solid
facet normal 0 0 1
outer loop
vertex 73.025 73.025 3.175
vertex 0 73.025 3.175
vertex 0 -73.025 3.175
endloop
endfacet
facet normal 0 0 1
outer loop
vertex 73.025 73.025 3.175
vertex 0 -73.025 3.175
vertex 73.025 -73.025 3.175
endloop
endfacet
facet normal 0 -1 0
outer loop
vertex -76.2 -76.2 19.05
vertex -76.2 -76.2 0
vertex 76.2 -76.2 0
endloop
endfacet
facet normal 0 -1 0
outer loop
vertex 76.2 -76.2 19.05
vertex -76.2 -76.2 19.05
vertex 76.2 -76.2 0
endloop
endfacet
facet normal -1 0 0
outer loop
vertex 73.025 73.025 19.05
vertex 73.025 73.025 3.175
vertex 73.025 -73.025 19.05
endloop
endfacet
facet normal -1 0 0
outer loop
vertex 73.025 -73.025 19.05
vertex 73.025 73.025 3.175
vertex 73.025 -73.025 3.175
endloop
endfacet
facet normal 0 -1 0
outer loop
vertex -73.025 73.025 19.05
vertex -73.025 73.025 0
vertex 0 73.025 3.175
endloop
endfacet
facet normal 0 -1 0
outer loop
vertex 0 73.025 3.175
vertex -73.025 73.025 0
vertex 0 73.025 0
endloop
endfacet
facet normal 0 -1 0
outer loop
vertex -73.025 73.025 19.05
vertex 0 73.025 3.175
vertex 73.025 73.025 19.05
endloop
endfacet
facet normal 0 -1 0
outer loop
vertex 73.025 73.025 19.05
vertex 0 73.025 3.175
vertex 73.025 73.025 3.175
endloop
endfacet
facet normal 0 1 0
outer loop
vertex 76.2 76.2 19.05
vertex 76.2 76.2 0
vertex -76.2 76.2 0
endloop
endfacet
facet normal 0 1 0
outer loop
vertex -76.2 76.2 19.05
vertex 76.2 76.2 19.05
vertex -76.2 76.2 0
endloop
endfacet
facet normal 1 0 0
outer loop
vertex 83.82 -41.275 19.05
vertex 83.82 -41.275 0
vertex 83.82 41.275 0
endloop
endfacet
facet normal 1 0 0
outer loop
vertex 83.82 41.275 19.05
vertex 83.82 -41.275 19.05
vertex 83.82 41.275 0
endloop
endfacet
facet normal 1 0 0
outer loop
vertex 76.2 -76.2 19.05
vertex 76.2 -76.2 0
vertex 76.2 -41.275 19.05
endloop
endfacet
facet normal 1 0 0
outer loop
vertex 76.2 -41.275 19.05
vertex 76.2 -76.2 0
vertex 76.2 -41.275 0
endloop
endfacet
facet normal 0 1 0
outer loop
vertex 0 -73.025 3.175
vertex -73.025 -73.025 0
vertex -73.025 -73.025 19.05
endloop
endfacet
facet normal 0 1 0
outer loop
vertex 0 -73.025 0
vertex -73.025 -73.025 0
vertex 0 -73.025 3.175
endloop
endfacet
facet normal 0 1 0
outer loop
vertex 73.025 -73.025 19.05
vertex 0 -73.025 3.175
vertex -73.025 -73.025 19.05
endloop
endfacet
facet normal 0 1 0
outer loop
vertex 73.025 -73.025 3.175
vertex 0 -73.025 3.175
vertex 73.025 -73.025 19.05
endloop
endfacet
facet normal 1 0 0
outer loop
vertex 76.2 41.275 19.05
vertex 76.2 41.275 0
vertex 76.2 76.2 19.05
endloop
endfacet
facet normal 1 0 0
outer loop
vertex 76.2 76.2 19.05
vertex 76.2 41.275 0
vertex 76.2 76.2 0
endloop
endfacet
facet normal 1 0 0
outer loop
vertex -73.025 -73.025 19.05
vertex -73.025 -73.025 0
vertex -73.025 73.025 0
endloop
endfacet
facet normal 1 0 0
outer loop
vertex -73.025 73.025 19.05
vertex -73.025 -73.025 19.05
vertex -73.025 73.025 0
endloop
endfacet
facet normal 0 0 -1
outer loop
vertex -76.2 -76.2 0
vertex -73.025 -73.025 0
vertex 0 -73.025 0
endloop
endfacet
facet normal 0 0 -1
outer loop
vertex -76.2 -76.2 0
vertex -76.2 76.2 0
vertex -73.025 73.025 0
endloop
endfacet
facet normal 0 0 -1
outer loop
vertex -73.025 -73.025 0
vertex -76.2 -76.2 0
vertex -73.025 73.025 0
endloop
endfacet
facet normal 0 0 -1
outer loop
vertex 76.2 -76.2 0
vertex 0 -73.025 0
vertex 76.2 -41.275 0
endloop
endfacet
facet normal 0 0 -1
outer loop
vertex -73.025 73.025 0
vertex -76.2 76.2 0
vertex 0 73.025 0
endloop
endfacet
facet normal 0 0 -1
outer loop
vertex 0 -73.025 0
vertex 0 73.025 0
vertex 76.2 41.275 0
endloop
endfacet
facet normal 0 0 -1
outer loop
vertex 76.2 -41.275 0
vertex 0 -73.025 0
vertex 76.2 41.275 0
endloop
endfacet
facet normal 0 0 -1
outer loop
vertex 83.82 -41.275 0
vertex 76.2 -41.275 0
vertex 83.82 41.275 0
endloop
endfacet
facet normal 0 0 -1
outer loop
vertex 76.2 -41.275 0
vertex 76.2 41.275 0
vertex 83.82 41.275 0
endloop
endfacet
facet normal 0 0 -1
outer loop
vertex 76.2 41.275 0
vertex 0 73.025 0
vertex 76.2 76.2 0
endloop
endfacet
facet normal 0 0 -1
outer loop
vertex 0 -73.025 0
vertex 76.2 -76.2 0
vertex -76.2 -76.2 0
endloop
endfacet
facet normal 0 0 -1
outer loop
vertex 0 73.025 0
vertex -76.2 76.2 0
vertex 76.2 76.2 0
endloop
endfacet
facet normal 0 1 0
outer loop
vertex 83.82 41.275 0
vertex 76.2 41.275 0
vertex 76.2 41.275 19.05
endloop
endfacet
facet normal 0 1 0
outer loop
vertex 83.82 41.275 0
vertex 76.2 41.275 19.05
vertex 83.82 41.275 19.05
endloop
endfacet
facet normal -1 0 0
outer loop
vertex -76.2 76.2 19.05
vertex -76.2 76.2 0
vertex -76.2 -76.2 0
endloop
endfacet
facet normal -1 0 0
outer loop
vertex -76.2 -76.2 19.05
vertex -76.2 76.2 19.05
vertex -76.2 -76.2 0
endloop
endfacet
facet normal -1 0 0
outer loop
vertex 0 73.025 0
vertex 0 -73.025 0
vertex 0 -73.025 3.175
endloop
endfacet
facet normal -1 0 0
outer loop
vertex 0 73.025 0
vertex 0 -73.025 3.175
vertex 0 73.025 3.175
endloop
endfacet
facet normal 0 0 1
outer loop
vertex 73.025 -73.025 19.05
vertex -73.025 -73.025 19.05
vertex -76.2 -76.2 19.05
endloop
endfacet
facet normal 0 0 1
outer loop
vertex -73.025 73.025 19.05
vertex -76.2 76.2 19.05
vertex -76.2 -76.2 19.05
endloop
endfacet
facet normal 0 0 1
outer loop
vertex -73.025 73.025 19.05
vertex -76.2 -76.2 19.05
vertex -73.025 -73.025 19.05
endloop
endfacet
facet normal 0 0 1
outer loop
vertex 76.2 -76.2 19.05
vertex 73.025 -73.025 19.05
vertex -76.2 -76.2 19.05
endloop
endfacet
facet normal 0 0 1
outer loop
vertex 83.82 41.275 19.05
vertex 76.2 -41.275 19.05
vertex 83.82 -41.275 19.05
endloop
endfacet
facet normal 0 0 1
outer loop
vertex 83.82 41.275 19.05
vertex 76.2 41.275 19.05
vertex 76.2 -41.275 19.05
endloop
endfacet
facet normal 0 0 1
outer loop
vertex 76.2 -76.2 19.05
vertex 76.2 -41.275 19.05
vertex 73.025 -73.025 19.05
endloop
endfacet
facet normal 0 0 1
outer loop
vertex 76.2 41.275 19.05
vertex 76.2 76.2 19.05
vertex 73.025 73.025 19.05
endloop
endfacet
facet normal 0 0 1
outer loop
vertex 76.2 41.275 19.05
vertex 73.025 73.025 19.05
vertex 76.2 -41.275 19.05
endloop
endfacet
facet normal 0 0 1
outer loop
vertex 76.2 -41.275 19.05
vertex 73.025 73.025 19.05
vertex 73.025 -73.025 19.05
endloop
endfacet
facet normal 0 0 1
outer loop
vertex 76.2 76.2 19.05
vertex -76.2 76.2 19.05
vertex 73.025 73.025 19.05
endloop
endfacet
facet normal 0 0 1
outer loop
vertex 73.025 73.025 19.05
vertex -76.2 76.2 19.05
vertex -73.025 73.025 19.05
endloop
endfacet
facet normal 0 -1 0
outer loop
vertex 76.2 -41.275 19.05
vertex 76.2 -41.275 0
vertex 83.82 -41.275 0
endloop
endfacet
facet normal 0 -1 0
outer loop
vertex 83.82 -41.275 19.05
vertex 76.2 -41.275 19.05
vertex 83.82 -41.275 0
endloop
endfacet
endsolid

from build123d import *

# Parameters (mm, degrees)
F0_W     = 146.05
F0_H     = 3.175
F1_DEPTH = 19.05
F2_W     = 73.025
F2_H     = 146.05
F3_DEPTH = 3.175
F4_W     = 7.62
F4_H     = 82.55
F5_DEPTH = 19.05


with BuildPart() as f1:
    # F0 (on Top) → F1 (new body)
    with BuildSketch(Plane.XY):
        Polygon((-73.025, 73.025), (-73.025, 76.2), (-76.2, 76.2), (-76.2, -76.2), (-73.025, -76.2), (-73.025, -73.025), align=None)
        with Locations((0, 74.6125)):
            Rectangle(F0_W, F0_H)
        Polygon((76.2, -76.2), (76.2, 76.2), (73.025, 76.2), (73.025, 73.025), (73.025, -73.025), (73.025, -76.2), align=None)
        with Locations((0, -74.6125)):
            Rectangle(F0_W, F0_H)
    extrude(amount=F1_DEPTH)

    # F2 (on Top) → F3 (join)
    with BuildSketch(Plane.XY):
        with Locations((36.5125, 0)):
            Rectangle(F2_W, F2_H)
    extrude(amount=F3_DEPTH)

    # F4 (on Top) → F5 (join)
    with BuildSketch(Plane.XY):
        with Locations((80.01, 0)):
            Rectangle(F4_W, F4_H)
    extrude(amount=F5_DEPTH)


solid = f1.part
